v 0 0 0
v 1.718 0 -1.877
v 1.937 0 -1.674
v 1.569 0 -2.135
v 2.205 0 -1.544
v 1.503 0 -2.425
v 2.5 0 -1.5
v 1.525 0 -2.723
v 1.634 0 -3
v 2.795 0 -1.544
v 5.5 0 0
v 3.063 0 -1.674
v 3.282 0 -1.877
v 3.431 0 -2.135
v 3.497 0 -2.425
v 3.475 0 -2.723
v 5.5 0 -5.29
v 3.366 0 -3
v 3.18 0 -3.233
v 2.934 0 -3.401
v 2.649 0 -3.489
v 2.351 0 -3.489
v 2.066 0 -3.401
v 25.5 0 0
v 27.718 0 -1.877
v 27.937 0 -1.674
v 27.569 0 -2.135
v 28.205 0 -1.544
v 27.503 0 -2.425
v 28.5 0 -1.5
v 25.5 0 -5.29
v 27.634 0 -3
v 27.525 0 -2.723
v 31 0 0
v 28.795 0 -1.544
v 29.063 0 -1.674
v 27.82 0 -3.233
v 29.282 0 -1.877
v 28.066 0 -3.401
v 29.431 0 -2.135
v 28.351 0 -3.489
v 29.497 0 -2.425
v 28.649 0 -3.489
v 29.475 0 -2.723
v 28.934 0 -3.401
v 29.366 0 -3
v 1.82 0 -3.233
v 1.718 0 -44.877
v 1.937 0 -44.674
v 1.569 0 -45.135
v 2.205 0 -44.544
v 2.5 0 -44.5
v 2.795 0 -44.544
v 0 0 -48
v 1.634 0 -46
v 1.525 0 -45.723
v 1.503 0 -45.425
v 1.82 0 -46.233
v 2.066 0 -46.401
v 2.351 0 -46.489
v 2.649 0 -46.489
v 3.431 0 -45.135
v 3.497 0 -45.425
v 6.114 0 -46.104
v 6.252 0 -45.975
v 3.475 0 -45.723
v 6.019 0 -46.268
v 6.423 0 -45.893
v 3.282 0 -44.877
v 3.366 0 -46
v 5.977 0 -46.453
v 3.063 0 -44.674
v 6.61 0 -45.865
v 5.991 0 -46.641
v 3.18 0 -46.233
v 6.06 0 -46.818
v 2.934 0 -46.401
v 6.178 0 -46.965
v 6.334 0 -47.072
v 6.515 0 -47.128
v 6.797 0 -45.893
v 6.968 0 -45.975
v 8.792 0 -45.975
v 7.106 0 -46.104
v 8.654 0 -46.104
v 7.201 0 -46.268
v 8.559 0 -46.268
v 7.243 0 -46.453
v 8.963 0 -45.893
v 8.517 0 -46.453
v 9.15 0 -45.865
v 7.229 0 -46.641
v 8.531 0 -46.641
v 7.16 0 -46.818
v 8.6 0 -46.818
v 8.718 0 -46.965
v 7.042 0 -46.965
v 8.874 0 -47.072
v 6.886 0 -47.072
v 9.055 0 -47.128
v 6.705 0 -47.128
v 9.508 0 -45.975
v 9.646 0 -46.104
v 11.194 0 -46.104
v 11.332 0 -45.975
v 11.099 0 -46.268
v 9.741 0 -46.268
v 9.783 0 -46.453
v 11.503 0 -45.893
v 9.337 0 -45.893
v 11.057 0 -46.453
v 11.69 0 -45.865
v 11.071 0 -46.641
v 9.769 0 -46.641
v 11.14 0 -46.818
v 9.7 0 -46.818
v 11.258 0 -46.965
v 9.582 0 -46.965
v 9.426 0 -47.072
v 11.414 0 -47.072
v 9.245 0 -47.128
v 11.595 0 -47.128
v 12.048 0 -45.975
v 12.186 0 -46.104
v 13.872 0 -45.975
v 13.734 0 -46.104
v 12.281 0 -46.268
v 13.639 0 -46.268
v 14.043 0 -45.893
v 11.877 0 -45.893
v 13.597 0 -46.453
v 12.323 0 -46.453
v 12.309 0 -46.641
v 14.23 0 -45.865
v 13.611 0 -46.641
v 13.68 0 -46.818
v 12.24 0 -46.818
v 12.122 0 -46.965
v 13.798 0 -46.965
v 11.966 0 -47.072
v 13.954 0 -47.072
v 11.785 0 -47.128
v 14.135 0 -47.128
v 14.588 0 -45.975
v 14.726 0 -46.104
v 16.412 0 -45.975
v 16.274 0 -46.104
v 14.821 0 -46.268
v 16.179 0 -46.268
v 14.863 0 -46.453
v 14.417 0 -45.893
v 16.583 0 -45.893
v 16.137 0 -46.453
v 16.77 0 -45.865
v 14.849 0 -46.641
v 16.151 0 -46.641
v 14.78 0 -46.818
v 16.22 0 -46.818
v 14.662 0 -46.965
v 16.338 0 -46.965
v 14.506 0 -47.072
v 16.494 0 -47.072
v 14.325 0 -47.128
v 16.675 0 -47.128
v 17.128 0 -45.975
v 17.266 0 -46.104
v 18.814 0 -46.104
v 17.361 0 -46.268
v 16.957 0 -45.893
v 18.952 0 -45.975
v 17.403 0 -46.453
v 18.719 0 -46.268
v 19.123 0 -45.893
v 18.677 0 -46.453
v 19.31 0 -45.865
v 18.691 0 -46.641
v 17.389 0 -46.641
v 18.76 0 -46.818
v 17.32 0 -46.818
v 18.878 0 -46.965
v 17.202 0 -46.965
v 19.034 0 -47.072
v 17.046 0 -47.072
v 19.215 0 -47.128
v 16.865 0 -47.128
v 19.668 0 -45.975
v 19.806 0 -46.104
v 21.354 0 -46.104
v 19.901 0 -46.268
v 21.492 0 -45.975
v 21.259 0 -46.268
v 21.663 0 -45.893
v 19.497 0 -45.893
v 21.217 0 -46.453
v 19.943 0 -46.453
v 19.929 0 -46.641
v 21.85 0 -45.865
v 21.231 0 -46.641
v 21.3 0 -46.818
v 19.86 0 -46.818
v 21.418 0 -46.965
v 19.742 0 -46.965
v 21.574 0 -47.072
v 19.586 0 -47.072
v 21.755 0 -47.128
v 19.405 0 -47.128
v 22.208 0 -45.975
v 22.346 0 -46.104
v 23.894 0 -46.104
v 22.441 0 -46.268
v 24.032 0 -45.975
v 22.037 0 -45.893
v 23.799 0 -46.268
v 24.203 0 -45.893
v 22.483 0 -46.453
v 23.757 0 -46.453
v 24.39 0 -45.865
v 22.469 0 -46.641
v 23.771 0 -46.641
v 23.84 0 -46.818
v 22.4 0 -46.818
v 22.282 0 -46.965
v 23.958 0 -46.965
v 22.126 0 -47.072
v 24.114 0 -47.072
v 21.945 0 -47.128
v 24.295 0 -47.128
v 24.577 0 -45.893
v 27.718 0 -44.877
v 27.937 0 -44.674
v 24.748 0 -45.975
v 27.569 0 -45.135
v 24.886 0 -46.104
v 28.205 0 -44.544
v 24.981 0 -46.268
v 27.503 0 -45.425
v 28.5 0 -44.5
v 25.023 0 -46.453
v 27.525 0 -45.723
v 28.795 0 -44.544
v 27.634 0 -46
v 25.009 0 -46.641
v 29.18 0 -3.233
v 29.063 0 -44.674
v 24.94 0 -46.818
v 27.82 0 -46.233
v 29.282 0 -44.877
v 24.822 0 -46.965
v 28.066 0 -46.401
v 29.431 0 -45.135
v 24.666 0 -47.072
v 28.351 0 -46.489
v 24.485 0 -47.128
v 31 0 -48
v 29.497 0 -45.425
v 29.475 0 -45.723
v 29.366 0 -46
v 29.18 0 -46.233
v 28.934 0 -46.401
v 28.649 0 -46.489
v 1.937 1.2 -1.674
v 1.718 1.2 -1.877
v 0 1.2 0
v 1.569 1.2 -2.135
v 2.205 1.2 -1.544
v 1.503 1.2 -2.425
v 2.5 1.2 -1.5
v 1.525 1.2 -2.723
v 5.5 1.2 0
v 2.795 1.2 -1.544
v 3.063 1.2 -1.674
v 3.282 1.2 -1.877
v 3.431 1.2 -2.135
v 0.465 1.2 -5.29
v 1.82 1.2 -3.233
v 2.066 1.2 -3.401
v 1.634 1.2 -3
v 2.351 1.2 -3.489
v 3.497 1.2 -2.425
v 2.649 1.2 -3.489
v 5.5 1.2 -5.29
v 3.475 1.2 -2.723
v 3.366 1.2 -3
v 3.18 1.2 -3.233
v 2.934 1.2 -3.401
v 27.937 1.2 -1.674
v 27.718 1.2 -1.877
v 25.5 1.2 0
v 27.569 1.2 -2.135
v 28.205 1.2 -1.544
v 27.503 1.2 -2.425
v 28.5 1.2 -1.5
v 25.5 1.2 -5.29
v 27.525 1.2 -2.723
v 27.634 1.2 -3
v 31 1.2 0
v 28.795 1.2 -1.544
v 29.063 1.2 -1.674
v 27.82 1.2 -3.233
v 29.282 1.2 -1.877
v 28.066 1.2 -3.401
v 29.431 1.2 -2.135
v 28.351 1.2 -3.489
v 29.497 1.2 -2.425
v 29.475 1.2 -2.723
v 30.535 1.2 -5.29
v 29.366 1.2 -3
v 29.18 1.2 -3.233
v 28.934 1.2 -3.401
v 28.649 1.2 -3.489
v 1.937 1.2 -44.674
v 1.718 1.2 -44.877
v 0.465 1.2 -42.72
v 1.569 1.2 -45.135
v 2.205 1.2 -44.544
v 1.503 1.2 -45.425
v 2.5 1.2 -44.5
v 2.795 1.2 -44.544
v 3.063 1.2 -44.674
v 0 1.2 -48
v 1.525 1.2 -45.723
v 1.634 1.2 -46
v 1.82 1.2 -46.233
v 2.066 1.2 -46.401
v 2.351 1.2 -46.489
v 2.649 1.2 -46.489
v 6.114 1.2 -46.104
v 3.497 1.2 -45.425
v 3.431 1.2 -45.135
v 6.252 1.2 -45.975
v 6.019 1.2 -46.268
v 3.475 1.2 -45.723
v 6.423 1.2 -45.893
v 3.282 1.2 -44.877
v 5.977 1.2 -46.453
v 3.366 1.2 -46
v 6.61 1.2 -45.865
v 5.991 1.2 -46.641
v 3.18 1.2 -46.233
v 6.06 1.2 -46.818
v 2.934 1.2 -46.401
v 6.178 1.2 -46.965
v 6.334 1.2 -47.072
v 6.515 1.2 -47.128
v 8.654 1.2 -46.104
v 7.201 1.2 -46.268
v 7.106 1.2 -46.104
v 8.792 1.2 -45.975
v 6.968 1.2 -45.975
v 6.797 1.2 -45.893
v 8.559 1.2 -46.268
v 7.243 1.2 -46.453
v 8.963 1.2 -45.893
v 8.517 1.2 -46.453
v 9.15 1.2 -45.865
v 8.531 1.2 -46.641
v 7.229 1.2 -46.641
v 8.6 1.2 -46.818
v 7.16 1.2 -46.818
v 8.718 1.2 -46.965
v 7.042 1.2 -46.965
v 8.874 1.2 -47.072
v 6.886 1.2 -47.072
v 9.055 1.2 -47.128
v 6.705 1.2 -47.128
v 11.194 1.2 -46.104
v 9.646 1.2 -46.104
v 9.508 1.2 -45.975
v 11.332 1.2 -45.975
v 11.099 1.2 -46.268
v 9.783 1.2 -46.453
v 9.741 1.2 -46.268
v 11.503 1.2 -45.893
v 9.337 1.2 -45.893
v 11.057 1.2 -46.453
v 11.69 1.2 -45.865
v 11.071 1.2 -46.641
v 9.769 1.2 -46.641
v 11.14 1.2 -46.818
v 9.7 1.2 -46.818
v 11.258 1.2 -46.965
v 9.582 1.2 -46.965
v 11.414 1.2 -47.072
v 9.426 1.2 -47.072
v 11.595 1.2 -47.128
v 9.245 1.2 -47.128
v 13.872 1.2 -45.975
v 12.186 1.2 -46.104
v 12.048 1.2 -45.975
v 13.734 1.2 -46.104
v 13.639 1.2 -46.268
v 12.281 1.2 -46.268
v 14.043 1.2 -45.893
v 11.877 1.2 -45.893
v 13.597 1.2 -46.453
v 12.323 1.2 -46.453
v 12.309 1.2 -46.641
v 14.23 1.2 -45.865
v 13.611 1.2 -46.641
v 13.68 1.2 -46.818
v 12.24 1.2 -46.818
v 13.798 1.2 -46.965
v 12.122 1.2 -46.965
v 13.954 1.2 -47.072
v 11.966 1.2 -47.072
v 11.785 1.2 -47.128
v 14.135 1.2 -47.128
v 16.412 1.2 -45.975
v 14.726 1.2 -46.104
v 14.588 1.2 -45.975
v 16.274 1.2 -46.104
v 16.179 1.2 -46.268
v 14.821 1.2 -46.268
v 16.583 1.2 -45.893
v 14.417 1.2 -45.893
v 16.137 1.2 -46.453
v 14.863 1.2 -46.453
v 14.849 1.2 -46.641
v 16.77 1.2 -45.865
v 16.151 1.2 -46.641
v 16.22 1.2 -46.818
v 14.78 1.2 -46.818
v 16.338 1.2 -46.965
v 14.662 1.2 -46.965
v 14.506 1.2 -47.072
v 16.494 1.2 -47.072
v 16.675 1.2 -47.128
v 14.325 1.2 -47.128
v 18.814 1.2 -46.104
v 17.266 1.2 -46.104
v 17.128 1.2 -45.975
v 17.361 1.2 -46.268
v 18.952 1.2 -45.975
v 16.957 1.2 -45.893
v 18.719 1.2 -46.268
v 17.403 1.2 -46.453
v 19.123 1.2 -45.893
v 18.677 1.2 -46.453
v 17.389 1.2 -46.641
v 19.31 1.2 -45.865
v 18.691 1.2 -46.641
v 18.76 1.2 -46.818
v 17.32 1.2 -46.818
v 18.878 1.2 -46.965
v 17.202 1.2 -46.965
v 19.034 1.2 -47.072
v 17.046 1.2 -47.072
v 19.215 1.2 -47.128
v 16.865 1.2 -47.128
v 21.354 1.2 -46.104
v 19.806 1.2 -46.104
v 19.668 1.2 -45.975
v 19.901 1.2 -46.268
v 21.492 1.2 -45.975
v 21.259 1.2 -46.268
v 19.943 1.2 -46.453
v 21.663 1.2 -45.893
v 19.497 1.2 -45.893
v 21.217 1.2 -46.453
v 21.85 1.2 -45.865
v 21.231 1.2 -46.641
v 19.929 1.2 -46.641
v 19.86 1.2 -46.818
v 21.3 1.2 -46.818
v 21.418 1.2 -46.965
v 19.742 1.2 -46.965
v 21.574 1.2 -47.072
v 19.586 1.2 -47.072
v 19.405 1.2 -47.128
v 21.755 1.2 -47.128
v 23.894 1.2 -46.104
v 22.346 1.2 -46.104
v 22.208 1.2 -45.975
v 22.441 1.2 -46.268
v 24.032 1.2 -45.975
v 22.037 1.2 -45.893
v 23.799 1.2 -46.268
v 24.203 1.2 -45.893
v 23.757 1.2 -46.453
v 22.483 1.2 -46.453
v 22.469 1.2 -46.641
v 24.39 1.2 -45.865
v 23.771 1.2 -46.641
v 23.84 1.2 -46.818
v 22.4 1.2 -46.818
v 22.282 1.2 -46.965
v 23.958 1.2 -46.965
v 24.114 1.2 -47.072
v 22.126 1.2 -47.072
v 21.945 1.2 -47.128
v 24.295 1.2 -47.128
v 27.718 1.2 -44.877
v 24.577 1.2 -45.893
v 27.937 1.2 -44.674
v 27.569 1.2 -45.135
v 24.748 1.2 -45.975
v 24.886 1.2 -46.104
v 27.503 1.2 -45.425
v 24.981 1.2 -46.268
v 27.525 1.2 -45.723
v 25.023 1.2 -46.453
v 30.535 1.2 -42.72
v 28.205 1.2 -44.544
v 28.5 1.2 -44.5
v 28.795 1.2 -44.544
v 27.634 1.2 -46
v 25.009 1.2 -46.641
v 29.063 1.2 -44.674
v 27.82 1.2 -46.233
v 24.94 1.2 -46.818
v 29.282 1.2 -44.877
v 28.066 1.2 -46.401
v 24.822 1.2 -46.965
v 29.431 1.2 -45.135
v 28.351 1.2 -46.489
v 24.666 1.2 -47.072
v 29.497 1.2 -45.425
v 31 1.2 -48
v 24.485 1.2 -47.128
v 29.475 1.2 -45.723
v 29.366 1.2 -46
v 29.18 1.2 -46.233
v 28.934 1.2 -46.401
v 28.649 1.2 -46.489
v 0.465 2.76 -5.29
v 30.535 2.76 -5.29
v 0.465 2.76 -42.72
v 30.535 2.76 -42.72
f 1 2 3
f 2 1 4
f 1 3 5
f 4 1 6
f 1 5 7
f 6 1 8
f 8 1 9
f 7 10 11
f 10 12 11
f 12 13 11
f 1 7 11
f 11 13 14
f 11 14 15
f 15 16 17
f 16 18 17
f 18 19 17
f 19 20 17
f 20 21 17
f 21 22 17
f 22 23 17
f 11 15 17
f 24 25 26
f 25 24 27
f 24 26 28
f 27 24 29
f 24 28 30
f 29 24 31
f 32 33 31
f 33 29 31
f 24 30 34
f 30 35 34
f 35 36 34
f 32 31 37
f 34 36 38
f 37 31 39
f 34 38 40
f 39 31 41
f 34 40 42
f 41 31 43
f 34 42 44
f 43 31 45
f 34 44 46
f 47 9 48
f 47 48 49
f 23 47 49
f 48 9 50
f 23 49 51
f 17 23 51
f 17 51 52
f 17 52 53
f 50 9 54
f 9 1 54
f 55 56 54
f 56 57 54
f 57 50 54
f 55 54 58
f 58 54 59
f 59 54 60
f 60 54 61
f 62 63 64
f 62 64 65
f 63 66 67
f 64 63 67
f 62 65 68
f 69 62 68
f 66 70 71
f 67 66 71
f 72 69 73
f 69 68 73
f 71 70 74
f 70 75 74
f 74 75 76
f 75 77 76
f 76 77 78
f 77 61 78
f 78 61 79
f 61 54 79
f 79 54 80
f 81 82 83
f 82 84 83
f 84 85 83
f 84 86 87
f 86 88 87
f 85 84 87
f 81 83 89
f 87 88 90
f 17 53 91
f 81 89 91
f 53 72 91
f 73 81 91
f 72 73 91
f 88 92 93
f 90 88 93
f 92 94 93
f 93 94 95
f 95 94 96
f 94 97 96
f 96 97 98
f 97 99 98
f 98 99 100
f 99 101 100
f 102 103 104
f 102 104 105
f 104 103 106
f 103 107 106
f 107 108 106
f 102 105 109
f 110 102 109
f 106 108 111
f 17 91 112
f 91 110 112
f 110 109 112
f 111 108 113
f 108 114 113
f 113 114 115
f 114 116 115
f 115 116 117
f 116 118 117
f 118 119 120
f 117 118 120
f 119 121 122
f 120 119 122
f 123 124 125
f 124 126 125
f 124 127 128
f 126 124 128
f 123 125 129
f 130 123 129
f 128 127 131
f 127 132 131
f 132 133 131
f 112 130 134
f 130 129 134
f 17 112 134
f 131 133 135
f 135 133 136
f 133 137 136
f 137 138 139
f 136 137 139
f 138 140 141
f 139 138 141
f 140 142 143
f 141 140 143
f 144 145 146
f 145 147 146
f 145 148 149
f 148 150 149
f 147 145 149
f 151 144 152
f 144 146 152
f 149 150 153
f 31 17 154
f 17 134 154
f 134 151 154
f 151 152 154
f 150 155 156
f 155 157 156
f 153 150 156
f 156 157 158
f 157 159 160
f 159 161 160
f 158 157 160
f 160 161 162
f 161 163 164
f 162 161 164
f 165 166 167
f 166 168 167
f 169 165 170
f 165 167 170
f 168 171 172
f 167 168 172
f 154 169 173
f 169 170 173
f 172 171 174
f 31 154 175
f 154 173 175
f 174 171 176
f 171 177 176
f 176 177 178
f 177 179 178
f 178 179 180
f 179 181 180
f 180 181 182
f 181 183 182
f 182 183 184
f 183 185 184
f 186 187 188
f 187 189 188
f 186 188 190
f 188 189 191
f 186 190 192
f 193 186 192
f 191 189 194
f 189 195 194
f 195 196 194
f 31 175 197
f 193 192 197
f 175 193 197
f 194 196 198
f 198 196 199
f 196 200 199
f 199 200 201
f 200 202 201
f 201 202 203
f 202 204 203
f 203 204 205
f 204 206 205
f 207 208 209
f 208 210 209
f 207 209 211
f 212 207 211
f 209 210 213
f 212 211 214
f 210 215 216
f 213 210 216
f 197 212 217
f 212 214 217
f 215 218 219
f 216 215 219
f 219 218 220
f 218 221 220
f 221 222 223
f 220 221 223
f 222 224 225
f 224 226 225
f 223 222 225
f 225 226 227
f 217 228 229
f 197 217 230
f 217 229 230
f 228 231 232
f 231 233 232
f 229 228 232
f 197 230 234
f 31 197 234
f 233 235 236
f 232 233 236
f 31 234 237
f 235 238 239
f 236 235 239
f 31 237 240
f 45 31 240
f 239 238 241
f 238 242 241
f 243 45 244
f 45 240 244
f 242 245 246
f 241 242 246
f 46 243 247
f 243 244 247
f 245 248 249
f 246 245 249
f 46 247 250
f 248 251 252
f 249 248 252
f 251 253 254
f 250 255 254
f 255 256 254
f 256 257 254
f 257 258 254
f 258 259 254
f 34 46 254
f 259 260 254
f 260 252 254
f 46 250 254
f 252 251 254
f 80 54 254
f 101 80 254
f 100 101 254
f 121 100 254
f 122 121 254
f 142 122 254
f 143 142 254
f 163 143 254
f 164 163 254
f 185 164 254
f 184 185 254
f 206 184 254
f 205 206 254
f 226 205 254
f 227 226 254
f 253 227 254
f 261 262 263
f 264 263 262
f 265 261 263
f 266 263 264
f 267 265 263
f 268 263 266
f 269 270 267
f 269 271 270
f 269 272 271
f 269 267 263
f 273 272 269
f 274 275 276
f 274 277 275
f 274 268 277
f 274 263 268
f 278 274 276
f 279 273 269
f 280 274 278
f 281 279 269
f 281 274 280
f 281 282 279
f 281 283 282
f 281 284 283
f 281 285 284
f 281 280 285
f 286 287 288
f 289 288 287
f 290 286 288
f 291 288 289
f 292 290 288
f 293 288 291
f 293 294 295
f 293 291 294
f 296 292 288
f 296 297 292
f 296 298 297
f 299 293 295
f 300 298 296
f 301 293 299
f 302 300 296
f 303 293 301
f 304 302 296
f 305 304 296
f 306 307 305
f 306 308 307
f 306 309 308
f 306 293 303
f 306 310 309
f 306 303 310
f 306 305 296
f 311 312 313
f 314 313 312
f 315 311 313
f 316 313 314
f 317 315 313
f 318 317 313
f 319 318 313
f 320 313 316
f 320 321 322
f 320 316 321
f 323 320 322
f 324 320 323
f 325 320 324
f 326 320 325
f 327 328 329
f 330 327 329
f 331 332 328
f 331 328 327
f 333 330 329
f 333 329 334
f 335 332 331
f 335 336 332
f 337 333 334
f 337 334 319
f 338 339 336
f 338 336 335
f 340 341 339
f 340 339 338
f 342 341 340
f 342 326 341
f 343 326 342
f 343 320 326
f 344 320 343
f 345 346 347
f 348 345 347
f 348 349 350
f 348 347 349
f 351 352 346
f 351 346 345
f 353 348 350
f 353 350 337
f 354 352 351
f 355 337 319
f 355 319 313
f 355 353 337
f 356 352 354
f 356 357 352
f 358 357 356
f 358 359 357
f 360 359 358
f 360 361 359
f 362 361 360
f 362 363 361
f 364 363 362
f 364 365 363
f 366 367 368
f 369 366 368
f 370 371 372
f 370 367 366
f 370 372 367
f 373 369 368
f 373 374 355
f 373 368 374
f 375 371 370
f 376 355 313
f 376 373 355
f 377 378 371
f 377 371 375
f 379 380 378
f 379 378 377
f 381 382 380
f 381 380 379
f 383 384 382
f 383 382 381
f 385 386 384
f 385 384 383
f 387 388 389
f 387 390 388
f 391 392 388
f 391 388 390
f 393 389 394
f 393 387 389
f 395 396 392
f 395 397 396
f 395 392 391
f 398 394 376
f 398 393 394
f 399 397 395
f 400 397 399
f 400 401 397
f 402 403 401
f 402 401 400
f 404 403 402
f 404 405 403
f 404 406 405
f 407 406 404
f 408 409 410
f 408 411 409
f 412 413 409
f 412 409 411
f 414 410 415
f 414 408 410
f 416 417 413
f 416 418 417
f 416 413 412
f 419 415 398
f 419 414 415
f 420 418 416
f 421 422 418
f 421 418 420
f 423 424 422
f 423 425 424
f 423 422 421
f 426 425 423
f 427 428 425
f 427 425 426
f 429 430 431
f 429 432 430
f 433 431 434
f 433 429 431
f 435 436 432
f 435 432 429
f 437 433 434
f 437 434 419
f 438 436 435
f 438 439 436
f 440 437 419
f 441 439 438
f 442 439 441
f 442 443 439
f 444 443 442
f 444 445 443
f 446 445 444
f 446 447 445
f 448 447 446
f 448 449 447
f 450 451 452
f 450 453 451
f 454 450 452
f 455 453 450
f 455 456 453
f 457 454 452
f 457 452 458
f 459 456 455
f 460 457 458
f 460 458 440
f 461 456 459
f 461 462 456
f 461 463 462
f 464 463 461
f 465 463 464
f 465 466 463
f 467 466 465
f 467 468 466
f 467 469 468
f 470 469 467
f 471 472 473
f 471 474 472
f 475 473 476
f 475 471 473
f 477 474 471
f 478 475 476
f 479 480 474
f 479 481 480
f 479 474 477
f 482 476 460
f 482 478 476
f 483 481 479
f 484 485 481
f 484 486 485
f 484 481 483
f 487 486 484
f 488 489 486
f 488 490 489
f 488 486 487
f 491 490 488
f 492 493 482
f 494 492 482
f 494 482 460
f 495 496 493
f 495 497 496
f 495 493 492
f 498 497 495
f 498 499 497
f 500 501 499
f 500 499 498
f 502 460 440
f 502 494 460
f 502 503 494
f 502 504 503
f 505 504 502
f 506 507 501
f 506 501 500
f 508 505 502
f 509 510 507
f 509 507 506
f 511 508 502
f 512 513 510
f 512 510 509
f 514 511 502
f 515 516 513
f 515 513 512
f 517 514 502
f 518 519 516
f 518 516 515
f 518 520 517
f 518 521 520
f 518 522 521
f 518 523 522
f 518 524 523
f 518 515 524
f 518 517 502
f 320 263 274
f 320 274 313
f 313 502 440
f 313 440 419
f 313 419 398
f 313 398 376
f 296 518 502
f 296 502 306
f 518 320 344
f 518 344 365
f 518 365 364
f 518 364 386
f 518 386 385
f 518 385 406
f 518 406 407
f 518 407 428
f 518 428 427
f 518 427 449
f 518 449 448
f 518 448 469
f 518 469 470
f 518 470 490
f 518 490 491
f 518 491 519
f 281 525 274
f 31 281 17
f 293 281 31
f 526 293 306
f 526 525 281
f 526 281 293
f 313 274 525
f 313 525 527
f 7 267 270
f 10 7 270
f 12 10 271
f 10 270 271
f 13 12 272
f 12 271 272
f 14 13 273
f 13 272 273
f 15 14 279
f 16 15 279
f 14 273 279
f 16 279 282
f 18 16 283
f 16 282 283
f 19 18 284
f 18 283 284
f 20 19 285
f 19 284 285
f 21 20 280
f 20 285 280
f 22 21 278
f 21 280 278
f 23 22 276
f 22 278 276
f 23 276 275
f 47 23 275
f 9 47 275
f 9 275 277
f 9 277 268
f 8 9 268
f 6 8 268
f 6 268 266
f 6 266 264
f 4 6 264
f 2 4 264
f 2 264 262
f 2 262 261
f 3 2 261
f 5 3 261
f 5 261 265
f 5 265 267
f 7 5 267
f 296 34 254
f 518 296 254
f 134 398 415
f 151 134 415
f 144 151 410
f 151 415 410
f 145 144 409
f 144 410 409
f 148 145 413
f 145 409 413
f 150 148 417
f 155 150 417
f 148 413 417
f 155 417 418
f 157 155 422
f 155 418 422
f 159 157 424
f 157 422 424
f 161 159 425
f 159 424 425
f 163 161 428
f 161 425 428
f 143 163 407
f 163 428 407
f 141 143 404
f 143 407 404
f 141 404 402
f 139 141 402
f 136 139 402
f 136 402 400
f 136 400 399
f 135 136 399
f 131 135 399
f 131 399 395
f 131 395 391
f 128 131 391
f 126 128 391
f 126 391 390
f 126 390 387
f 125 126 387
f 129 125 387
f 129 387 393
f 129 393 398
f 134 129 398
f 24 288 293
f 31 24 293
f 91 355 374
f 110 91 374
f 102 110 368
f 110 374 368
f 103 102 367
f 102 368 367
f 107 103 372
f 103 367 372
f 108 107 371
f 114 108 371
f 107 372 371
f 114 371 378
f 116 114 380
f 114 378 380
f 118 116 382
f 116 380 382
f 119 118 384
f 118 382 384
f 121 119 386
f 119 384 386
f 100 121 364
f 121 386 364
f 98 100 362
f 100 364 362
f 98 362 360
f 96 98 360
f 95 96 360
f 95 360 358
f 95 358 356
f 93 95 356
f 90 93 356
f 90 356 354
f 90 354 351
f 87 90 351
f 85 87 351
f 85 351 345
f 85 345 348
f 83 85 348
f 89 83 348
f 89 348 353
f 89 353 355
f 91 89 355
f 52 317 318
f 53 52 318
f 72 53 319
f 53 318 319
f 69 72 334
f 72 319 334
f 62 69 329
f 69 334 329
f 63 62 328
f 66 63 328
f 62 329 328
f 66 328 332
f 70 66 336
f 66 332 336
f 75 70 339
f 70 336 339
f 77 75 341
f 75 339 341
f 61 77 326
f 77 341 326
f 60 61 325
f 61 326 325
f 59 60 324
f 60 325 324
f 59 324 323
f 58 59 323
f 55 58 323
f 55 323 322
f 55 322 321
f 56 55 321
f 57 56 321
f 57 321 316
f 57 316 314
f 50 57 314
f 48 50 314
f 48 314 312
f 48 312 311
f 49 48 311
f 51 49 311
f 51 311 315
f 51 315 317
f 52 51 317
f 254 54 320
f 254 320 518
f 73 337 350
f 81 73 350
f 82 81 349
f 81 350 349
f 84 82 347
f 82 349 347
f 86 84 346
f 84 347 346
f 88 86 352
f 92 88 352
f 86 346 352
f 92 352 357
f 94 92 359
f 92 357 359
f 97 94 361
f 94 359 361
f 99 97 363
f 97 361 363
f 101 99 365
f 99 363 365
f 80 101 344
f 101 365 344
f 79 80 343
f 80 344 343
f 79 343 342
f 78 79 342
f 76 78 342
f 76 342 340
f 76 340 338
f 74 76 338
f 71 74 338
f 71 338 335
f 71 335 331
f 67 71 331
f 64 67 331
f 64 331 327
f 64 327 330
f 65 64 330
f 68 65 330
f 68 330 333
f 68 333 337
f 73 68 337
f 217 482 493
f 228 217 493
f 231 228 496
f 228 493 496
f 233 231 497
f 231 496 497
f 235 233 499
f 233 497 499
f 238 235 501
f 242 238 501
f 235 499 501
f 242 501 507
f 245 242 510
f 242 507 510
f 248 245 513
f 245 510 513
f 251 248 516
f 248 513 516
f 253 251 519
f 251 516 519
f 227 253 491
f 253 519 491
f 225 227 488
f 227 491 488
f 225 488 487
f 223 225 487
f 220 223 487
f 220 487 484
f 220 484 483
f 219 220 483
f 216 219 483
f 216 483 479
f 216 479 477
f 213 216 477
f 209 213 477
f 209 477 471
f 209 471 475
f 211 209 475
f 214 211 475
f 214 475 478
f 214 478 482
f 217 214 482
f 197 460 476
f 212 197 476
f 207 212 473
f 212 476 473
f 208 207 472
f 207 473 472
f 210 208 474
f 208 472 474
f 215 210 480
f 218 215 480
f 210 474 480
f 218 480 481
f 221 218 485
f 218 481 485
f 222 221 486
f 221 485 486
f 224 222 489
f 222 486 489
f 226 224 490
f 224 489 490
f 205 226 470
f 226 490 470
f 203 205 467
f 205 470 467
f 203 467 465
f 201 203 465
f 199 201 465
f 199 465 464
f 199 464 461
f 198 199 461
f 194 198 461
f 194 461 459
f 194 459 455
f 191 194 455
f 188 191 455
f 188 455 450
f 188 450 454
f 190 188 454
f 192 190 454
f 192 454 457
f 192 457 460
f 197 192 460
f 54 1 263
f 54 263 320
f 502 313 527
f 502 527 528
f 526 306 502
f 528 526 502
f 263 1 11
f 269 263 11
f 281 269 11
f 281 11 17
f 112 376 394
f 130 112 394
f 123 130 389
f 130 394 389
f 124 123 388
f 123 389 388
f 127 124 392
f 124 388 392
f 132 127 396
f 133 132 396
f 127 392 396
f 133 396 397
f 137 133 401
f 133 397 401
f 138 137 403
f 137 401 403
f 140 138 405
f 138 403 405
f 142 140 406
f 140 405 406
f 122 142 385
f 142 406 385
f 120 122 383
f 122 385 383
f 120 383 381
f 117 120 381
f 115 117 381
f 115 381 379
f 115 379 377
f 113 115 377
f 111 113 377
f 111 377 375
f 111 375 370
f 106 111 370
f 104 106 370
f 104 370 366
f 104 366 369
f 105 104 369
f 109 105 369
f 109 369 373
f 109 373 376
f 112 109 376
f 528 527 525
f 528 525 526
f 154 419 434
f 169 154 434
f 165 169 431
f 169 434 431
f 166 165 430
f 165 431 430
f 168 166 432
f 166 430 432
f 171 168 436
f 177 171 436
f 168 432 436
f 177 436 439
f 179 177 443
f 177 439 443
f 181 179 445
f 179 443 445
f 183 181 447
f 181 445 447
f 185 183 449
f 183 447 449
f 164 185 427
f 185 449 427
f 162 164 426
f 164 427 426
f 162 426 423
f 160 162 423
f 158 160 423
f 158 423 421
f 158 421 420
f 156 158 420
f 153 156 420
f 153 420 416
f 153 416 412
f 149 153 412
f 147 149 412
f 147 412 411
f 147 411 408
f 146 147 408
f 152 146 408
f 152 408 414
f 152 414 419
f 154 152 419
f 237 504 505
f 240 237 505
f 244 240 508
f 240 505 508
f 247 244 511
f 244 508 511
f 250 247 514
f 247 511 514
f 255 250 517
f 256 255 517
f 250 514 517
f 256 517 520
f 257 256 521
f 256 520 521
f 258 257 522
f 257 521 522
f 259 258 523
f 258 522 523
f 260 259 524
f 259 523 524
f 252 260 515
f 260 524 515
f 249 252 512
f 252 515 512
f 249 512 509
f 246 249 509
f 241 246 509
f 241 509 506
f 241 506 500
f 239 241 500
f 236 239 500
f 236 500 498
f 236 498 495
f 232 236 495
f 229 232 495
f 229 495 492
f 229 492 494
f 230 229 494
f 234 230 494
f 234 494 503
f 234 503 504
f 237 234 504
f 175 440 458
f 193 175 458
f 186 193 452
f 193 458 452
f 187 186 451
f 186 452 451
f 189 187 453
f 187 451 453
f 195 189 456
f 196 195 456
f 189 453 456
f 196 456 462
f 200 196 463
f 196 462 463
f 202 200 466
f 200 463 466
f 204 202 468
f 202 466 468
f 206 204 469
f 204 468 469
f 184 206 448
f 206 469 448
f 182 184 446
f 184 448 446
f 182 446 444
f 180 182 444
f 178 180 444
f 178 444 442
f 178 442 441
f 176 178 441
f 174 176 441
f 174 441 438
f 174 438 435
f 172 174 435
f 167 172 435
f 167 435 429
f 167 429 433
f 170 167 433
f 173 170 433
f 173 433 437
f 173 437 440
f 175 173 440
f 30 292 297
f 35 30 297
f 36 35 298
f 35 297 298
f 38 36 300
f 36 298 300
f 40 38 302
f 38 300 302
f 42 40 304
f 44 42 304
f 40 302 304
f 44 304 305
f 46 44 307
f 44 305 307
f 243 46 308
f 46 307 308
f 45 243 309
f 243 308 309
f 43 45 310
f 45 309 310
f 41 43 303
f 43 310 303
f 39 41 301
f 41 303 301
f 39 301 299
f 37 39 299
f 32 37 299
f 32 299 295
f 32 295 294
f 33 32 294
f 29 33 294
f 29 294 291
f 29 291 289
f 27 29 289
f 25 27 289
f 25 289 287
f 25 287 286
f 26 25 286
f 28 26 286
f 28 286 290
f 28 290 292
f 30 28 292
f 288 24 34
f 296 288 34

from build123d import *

# Parameters (mm, degrees)
SKETCH_1_W             = 31
SKETCH_1_H             = 48
EXTRUDE_1_DEPTH        = 1.2
SKETCH_2_W             = 30.07
SKETCH_2_H             = 37.43
EXTRUDE_2_DEPTH        = 1.56
SKETCH_4_R             = 0.635
CUT_EXTRUDE_1_DEPTH    = 58.16146954
PATTERN_LINEAR_1_COUNT = 8
PATTERN_LINEAR_1_PITCH = 2.54
SKETCH_6_R             = 1
SKETCH_6_W             = 20
SKETCH_6_H             = 5.29
CUT_EXTRUDE_2_DEPTH    = 58.16146954


with BuildPart() as part:
    # 草图1 → 凸台-拉伸1 (new body)
    with BuildSketch(Plane(origin=(0, 0, 0), x_dir=(1, 0, 0), z_dir=(0, 1, 0))):
        with Locations((15.5, 24)):
            Rectangle(SKETCH_1_W, SKETCH_1_H)
    extrude(amount=EXTRUDE_1_DEPTH)

    # 草图2 → 凸台-拉伸2 (add)
    with BuildSketch(Plane(origin=(0, 1.2, 0), x_dir=(1, 0, 0), z_dir=(0, 1, 0))):
        with Locations((15.5, 24.005)):
            Rectangle(SKETCH_2_W, SKETCH_2_H)
    extrude(amount=EXTRUDE_2_DEPTH)

    # 草图4 → 切除-拉伸1 (cut, through all)
    with BuildSketch(Plane(origin=(0, 1.2, 0), x_dir=(1, 0, 0), z_dir=(0, 1, 0))):
        with Locations(Location((6.61, 46.5, 0), (0, 0, 270))):
            Circle(SKETCH_4_R)
    cut_extrude_1 = extrude(amount=-CUT_EXTRUDE_1_DEPTH, mode=Mode.SUBTRACT)

    # 阵列(线性)1: 切除-拉伸1 ×8
    with Locations(*[(i * PATTERN_LINEAR_1_PITCH, 0, 0) for i in range(1, PATTERN_LINEAR_1_COUNT)]):
        add(cut_extrude_1, mode=Mode.SUBTRACT)

    # 草图6 → 切除-拉伸2 (cut, through all)
    with BuildSketch(Plane(origin=(0, 1.2, 0), x_dir=(1, 0, 0), z_dir=(0, 1, 0))):
        with Locations(Location((2.5, 45.5, 0), (0, 0, 270))):
            Circle(SKETCH_6_R)
        with Locations(Location((28.5, 45.5, 0), (0, 0, 270))):
            Circle(SKETCH_6_R)
        with Locations(Location((2.5, 2.5, 0), (0, 0, 270))):
            Circle(SKETCH_6_R)
        with Locations(Location((28.5, 2.5, 0), (0, 0, 270))):
            Circle(SKETCH_6_R)
        with Locations((15.5, 2.645)):
            Rectangle(SKETCH_6_W, SKETCH_6_H)
    extrude(amount=-CUT_EXTRUDE_2_DEPTH, mode=Mode.SUBTRACT)


solid = part.part
